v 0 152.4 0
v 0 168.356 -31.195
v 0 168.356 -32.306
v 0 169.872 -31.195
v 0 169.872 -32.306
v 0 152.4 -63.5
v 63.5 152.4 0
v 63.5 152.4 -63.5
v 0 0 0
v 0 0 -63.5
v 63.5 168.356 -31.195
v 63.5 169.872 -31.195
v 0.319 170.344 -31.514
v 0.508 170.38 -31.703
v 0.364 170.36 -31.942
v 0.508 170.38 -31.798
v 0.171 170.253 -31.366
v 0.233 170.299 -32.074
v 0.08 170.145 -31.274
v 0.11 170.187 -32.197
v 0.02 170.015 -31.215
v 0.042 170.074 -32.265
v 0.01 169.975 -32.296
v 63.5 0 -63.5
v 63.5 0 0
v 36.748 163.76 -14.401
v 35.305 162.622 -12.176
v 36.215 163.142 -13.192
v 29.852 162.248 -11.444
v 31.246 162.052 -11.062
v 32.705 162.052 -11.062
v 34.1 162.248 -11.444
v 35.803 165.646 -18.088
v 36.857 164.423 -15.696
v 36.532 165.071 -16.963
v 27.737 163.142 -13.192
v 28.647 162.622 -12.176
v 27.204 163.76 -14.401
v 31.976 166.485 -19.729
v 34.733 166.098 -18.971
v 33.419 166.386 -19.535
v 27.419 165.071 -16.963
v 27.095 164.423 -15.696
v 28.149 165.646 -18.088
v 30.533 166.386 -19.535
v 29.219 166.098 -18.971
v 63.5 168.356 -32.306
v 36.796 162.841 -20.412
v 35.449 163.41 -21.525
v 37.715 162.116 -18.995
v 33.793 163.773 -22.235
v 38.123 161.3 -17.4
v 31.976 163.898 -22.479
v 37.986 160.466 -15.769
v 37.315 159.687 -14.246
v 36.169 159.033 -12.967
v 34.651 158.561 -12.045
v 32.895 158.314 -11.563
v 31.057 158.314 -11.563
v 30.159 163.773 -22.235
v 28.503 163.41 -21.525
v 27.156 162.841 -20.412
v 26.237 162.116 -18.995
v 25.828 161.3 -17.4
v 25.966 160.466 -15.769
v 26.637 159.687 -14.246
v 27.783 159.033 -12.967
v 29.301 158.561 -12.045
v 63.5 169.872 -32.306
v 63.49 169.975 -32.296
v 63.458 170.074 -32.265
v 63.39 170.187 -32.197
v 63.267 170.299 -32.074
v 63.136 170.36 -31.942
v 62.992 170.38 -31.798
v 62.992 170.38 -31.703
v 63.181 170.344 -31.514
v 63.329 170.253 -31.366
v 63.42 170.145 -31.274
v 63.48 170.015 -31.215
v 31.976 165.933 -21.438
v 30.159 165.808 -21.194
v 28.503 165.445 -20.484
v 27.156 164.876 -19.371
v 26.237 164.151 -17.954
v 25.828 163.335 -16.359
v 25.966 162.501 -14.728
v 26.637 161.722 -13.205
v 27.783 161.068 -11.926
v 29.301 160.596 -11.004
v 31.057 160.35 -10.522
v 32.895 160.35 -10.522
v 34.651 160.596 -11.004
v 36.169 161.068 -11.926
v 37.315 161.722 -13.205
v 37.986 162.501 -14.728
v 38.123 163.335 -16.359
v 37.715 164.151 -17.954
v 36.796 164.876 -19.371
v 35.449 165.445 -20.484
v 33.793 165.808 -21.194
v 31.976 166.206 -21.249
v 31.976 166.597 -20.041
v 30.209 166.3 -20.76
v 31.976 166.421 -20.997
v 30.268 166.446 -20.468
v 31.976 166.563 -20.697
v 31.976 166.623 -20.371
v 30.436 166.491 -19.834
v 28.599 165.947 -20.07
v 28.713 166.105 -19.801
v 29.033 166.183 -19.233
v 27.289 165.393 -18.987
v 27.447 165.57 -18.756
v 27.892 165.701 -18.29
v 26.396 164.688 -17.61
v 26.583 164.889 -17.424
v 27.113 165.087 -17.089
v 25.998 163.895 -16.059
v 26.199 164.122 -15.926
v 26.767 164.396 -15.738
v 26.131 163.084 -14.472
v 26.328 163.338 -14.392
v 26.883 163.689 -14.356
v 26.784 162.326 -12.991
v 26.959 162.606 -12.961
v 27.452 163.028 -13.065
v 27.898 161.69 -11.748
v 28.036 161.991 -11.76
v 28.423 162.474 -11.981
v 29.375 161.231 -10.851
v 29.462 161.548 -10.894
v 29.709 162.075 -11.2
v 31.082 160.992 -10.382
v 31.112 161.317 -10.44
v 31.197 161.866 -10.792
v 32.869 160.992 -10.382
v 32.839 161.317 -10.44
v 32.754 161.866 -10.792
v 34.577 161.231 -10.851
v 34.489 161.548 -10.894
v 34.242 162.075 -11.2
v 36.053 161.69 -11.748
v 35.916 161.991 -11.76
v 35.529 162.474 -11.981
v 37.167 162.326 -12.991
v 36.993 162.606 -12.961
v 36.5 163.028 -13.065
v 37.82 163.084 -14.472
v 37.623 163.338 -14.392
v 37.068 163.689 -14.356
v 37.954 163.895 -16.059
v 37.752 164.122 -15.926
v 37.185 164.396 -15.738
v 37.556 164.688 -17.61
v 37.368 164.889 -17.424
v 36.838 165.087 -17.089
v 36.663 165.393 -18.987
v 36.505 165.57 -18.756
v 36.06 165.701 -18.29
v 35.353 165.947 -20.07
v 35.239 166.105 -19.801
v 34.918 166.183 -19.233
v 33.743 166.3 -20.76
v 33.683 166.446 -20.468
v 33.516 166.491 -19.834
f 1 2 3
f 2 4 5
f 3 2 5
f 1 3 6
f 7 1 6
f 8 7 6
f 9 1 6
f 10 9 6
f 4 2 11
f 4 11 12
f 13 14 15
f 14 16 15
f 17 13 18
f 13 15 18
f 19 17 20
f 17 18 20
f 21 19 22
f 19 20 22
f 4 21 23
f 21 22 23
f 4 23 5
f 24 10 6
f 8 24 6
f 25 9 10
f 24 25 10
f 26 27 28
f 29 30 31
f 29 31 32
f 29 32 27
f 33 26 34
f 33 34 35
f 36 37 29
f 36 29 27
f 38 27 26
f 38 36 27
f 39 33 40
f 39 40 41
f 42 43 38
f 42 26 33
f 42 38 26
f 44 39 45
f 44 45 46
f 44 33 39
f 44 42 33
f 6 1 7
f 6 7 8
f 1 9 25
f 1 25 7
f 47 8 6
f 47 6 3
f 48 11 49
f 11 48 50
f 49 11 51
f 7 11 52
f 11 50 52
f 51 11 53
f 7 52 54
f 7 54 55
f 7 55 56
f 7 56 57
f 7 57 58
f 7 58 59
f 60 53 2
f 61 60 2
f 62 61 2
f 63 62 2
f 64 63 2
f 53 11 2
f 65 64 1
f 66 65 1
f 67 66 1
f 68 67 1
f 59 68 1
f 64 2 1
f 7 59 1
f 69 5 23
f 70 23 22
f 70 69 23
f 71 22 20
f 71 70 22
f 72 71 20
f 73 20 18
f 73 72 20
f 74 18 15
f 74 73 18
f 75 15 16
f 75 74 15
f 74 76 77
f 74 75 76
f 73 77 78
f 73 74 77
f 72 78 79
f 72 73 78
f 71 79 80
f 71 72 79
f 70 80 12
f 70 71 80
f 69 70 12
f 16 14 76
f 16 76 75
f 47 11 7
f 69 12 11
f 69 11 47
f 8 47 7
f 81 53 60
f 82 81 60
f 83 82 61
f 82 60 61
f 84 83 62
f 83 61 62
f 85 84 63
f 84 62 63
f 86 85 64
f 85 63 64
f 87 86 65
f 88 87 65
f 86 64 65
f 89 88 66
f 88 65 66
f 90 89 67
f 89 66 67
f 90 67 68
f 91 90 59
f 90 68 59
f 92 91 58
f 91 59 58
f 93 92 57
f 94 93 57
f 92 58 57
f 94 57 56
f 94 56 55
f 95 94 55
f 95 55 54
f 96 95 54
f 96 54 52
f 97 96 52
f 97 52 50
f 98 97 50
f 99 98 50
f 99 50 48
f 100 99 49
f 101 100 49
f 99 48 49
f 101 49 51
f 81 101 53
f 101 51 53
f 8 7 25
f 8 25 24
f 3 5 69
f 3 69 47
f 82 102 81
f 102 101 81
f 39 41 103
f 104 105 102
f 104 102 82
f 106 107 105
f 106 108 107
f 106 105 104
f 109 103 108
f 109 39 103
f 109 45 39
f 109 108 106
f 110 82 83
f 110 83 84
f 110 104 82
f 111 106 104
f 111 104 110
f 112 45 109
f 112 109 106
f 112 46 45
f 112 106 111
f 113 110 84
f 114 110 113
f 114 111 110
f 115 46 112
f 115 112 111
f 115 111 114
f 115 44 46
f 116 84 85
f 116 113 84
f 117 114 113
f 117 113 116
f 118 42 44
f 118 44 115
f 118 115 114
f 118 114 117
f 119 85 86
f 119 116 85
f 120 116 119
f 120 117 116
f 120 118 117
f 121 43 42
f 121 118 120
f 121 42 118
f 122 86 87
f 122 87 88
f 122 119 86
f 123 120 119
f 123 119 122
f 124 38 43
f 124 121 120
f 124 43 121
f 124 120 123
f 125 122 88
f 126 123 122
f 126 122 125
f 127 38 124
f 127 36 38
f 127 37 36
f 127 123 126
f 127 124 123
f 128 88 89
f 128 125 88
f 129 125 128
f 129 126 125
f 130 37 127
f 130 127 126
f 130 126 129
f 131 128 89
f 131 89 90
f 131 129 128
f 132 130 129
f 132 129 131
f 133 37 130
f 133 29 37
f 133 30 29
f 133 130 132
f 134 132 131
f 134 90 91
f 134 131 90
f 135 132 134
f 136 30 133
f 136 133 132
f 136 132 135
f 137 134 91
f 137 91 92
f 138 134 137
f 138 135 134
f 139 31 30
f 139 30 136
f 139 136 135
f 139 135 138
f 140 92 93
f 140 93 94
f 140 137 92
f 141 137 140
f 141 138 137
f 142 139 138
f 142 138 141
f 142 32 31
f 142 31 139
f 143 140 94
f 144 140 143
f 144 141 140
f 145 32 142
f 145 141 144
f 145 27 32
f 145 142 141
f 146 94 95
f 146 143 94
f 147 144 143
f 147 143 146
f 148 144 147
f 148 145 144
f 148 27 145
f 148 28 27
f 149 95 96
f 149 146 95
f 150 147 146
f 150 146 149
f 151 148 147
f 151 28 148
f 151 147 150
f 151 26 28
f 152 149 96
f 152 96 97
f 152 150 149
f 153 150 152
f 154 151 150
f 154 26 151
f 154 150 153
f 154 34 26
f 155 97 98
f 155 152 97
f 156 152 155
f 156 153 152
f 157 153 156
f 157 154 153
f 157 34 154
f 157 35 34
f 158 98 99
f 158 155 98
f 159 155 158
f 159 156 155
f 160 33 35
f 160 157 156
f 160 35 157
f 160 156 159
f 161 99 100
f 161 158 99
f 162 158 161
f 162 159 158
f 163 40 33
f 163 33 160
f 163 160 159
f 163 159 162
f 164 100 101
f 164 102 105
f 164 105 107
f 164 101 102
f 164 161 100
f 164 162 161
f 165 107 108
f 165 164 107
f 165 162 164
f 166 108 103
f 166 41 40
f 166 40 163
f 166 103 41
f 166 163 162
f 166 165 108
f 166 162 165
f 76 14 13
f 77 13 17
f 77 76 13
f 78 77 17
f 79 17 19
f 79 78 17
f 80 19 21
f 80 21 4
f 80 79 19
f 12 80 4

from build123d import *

# Parameters (mm, degrees)
SKETCH3_W           = 63.5
SKETCH3_H           = 152.4
BOSS_EXTRUDE3_DEPTH = 63.5
BOSS_EXTRUDE5_DEPTH = 63.5
FILLET5_R           = 0.508
SKETCH6_R           = 6.164809323
BOSS_EXTRUDE6_DEPTH = 3.556
FILLET6_R           = 1.27


with BuildPart() as part:
    # Sketch3 → Boss-Extrude3 (new body)
    with BuildSketch(Plane(origin=(0, 0, 0), x_dir=(0, 0, -1), z_dir=(1, 0, 0))):
        with Locations((31.75, 76.2)):
            Rectangle(SKETCH3_W, SKETCH3_H)
    extrude(amount=BOSS_EXTRUDE3_DEPTH)


with BuildPart() as body_2:
    # Sketch5 → Boss-Extrude5 (new body)
    with BuildSketch(Plane.ZY):
        Polygon((-31.75, 168.640265914), (0, 152.4), (-63.5, 152.4), align=None)
        Polygon((-32.306234982, 170.380405738), (-32.306234982, 168.355749252), (-31.75, 168.640265914), (-31.194792849, 168.356274992), (-31.194792849, 170.380405738), align=None)
    extrude(amount=-BOSS_EXTRUDE5_DEPTH)

    # Fillet5
    fillet5_edges = [body_2.edges().sort_by_distance(p)[0] for p in [
        (31.75, 170.380405738, -32.306234982),
        (31.75, 170.380405738, -31.194792849),
        (63.5, 170.380405738, -31.750513916),
        (0, 170.380405738, -31.750513916),
    ]]
    fillet(fillet5_edges, radius=FILLET5_R)

    # Sketch6 → Boss-Extrude6 (add)
    with BuildSketch(Plane(origin=(0, 120.795462819, 61.787415352), x_dir=(1, 0, 0), z_dir=(0, 0.8902927311327395, 0.4553886833159204))):
        with Locations(Location((31.975845376, 88.484921492, 0), (0, 0, 90))):
            Circle(SKETCH6_R)
    extrude(amount=BOSS_EXTRUDE6_DEPTH)

    # Fillet6
    fillet6_edges = [body_2.edges().sort_by_distance(p)[0] for p in [
        (31.975845376, 161.448991262, -9.882219979),
    ]]
    fillet(fillet6_edges, radius=FILLET6_R)


solid = Compound([part.part, body_2.part])
